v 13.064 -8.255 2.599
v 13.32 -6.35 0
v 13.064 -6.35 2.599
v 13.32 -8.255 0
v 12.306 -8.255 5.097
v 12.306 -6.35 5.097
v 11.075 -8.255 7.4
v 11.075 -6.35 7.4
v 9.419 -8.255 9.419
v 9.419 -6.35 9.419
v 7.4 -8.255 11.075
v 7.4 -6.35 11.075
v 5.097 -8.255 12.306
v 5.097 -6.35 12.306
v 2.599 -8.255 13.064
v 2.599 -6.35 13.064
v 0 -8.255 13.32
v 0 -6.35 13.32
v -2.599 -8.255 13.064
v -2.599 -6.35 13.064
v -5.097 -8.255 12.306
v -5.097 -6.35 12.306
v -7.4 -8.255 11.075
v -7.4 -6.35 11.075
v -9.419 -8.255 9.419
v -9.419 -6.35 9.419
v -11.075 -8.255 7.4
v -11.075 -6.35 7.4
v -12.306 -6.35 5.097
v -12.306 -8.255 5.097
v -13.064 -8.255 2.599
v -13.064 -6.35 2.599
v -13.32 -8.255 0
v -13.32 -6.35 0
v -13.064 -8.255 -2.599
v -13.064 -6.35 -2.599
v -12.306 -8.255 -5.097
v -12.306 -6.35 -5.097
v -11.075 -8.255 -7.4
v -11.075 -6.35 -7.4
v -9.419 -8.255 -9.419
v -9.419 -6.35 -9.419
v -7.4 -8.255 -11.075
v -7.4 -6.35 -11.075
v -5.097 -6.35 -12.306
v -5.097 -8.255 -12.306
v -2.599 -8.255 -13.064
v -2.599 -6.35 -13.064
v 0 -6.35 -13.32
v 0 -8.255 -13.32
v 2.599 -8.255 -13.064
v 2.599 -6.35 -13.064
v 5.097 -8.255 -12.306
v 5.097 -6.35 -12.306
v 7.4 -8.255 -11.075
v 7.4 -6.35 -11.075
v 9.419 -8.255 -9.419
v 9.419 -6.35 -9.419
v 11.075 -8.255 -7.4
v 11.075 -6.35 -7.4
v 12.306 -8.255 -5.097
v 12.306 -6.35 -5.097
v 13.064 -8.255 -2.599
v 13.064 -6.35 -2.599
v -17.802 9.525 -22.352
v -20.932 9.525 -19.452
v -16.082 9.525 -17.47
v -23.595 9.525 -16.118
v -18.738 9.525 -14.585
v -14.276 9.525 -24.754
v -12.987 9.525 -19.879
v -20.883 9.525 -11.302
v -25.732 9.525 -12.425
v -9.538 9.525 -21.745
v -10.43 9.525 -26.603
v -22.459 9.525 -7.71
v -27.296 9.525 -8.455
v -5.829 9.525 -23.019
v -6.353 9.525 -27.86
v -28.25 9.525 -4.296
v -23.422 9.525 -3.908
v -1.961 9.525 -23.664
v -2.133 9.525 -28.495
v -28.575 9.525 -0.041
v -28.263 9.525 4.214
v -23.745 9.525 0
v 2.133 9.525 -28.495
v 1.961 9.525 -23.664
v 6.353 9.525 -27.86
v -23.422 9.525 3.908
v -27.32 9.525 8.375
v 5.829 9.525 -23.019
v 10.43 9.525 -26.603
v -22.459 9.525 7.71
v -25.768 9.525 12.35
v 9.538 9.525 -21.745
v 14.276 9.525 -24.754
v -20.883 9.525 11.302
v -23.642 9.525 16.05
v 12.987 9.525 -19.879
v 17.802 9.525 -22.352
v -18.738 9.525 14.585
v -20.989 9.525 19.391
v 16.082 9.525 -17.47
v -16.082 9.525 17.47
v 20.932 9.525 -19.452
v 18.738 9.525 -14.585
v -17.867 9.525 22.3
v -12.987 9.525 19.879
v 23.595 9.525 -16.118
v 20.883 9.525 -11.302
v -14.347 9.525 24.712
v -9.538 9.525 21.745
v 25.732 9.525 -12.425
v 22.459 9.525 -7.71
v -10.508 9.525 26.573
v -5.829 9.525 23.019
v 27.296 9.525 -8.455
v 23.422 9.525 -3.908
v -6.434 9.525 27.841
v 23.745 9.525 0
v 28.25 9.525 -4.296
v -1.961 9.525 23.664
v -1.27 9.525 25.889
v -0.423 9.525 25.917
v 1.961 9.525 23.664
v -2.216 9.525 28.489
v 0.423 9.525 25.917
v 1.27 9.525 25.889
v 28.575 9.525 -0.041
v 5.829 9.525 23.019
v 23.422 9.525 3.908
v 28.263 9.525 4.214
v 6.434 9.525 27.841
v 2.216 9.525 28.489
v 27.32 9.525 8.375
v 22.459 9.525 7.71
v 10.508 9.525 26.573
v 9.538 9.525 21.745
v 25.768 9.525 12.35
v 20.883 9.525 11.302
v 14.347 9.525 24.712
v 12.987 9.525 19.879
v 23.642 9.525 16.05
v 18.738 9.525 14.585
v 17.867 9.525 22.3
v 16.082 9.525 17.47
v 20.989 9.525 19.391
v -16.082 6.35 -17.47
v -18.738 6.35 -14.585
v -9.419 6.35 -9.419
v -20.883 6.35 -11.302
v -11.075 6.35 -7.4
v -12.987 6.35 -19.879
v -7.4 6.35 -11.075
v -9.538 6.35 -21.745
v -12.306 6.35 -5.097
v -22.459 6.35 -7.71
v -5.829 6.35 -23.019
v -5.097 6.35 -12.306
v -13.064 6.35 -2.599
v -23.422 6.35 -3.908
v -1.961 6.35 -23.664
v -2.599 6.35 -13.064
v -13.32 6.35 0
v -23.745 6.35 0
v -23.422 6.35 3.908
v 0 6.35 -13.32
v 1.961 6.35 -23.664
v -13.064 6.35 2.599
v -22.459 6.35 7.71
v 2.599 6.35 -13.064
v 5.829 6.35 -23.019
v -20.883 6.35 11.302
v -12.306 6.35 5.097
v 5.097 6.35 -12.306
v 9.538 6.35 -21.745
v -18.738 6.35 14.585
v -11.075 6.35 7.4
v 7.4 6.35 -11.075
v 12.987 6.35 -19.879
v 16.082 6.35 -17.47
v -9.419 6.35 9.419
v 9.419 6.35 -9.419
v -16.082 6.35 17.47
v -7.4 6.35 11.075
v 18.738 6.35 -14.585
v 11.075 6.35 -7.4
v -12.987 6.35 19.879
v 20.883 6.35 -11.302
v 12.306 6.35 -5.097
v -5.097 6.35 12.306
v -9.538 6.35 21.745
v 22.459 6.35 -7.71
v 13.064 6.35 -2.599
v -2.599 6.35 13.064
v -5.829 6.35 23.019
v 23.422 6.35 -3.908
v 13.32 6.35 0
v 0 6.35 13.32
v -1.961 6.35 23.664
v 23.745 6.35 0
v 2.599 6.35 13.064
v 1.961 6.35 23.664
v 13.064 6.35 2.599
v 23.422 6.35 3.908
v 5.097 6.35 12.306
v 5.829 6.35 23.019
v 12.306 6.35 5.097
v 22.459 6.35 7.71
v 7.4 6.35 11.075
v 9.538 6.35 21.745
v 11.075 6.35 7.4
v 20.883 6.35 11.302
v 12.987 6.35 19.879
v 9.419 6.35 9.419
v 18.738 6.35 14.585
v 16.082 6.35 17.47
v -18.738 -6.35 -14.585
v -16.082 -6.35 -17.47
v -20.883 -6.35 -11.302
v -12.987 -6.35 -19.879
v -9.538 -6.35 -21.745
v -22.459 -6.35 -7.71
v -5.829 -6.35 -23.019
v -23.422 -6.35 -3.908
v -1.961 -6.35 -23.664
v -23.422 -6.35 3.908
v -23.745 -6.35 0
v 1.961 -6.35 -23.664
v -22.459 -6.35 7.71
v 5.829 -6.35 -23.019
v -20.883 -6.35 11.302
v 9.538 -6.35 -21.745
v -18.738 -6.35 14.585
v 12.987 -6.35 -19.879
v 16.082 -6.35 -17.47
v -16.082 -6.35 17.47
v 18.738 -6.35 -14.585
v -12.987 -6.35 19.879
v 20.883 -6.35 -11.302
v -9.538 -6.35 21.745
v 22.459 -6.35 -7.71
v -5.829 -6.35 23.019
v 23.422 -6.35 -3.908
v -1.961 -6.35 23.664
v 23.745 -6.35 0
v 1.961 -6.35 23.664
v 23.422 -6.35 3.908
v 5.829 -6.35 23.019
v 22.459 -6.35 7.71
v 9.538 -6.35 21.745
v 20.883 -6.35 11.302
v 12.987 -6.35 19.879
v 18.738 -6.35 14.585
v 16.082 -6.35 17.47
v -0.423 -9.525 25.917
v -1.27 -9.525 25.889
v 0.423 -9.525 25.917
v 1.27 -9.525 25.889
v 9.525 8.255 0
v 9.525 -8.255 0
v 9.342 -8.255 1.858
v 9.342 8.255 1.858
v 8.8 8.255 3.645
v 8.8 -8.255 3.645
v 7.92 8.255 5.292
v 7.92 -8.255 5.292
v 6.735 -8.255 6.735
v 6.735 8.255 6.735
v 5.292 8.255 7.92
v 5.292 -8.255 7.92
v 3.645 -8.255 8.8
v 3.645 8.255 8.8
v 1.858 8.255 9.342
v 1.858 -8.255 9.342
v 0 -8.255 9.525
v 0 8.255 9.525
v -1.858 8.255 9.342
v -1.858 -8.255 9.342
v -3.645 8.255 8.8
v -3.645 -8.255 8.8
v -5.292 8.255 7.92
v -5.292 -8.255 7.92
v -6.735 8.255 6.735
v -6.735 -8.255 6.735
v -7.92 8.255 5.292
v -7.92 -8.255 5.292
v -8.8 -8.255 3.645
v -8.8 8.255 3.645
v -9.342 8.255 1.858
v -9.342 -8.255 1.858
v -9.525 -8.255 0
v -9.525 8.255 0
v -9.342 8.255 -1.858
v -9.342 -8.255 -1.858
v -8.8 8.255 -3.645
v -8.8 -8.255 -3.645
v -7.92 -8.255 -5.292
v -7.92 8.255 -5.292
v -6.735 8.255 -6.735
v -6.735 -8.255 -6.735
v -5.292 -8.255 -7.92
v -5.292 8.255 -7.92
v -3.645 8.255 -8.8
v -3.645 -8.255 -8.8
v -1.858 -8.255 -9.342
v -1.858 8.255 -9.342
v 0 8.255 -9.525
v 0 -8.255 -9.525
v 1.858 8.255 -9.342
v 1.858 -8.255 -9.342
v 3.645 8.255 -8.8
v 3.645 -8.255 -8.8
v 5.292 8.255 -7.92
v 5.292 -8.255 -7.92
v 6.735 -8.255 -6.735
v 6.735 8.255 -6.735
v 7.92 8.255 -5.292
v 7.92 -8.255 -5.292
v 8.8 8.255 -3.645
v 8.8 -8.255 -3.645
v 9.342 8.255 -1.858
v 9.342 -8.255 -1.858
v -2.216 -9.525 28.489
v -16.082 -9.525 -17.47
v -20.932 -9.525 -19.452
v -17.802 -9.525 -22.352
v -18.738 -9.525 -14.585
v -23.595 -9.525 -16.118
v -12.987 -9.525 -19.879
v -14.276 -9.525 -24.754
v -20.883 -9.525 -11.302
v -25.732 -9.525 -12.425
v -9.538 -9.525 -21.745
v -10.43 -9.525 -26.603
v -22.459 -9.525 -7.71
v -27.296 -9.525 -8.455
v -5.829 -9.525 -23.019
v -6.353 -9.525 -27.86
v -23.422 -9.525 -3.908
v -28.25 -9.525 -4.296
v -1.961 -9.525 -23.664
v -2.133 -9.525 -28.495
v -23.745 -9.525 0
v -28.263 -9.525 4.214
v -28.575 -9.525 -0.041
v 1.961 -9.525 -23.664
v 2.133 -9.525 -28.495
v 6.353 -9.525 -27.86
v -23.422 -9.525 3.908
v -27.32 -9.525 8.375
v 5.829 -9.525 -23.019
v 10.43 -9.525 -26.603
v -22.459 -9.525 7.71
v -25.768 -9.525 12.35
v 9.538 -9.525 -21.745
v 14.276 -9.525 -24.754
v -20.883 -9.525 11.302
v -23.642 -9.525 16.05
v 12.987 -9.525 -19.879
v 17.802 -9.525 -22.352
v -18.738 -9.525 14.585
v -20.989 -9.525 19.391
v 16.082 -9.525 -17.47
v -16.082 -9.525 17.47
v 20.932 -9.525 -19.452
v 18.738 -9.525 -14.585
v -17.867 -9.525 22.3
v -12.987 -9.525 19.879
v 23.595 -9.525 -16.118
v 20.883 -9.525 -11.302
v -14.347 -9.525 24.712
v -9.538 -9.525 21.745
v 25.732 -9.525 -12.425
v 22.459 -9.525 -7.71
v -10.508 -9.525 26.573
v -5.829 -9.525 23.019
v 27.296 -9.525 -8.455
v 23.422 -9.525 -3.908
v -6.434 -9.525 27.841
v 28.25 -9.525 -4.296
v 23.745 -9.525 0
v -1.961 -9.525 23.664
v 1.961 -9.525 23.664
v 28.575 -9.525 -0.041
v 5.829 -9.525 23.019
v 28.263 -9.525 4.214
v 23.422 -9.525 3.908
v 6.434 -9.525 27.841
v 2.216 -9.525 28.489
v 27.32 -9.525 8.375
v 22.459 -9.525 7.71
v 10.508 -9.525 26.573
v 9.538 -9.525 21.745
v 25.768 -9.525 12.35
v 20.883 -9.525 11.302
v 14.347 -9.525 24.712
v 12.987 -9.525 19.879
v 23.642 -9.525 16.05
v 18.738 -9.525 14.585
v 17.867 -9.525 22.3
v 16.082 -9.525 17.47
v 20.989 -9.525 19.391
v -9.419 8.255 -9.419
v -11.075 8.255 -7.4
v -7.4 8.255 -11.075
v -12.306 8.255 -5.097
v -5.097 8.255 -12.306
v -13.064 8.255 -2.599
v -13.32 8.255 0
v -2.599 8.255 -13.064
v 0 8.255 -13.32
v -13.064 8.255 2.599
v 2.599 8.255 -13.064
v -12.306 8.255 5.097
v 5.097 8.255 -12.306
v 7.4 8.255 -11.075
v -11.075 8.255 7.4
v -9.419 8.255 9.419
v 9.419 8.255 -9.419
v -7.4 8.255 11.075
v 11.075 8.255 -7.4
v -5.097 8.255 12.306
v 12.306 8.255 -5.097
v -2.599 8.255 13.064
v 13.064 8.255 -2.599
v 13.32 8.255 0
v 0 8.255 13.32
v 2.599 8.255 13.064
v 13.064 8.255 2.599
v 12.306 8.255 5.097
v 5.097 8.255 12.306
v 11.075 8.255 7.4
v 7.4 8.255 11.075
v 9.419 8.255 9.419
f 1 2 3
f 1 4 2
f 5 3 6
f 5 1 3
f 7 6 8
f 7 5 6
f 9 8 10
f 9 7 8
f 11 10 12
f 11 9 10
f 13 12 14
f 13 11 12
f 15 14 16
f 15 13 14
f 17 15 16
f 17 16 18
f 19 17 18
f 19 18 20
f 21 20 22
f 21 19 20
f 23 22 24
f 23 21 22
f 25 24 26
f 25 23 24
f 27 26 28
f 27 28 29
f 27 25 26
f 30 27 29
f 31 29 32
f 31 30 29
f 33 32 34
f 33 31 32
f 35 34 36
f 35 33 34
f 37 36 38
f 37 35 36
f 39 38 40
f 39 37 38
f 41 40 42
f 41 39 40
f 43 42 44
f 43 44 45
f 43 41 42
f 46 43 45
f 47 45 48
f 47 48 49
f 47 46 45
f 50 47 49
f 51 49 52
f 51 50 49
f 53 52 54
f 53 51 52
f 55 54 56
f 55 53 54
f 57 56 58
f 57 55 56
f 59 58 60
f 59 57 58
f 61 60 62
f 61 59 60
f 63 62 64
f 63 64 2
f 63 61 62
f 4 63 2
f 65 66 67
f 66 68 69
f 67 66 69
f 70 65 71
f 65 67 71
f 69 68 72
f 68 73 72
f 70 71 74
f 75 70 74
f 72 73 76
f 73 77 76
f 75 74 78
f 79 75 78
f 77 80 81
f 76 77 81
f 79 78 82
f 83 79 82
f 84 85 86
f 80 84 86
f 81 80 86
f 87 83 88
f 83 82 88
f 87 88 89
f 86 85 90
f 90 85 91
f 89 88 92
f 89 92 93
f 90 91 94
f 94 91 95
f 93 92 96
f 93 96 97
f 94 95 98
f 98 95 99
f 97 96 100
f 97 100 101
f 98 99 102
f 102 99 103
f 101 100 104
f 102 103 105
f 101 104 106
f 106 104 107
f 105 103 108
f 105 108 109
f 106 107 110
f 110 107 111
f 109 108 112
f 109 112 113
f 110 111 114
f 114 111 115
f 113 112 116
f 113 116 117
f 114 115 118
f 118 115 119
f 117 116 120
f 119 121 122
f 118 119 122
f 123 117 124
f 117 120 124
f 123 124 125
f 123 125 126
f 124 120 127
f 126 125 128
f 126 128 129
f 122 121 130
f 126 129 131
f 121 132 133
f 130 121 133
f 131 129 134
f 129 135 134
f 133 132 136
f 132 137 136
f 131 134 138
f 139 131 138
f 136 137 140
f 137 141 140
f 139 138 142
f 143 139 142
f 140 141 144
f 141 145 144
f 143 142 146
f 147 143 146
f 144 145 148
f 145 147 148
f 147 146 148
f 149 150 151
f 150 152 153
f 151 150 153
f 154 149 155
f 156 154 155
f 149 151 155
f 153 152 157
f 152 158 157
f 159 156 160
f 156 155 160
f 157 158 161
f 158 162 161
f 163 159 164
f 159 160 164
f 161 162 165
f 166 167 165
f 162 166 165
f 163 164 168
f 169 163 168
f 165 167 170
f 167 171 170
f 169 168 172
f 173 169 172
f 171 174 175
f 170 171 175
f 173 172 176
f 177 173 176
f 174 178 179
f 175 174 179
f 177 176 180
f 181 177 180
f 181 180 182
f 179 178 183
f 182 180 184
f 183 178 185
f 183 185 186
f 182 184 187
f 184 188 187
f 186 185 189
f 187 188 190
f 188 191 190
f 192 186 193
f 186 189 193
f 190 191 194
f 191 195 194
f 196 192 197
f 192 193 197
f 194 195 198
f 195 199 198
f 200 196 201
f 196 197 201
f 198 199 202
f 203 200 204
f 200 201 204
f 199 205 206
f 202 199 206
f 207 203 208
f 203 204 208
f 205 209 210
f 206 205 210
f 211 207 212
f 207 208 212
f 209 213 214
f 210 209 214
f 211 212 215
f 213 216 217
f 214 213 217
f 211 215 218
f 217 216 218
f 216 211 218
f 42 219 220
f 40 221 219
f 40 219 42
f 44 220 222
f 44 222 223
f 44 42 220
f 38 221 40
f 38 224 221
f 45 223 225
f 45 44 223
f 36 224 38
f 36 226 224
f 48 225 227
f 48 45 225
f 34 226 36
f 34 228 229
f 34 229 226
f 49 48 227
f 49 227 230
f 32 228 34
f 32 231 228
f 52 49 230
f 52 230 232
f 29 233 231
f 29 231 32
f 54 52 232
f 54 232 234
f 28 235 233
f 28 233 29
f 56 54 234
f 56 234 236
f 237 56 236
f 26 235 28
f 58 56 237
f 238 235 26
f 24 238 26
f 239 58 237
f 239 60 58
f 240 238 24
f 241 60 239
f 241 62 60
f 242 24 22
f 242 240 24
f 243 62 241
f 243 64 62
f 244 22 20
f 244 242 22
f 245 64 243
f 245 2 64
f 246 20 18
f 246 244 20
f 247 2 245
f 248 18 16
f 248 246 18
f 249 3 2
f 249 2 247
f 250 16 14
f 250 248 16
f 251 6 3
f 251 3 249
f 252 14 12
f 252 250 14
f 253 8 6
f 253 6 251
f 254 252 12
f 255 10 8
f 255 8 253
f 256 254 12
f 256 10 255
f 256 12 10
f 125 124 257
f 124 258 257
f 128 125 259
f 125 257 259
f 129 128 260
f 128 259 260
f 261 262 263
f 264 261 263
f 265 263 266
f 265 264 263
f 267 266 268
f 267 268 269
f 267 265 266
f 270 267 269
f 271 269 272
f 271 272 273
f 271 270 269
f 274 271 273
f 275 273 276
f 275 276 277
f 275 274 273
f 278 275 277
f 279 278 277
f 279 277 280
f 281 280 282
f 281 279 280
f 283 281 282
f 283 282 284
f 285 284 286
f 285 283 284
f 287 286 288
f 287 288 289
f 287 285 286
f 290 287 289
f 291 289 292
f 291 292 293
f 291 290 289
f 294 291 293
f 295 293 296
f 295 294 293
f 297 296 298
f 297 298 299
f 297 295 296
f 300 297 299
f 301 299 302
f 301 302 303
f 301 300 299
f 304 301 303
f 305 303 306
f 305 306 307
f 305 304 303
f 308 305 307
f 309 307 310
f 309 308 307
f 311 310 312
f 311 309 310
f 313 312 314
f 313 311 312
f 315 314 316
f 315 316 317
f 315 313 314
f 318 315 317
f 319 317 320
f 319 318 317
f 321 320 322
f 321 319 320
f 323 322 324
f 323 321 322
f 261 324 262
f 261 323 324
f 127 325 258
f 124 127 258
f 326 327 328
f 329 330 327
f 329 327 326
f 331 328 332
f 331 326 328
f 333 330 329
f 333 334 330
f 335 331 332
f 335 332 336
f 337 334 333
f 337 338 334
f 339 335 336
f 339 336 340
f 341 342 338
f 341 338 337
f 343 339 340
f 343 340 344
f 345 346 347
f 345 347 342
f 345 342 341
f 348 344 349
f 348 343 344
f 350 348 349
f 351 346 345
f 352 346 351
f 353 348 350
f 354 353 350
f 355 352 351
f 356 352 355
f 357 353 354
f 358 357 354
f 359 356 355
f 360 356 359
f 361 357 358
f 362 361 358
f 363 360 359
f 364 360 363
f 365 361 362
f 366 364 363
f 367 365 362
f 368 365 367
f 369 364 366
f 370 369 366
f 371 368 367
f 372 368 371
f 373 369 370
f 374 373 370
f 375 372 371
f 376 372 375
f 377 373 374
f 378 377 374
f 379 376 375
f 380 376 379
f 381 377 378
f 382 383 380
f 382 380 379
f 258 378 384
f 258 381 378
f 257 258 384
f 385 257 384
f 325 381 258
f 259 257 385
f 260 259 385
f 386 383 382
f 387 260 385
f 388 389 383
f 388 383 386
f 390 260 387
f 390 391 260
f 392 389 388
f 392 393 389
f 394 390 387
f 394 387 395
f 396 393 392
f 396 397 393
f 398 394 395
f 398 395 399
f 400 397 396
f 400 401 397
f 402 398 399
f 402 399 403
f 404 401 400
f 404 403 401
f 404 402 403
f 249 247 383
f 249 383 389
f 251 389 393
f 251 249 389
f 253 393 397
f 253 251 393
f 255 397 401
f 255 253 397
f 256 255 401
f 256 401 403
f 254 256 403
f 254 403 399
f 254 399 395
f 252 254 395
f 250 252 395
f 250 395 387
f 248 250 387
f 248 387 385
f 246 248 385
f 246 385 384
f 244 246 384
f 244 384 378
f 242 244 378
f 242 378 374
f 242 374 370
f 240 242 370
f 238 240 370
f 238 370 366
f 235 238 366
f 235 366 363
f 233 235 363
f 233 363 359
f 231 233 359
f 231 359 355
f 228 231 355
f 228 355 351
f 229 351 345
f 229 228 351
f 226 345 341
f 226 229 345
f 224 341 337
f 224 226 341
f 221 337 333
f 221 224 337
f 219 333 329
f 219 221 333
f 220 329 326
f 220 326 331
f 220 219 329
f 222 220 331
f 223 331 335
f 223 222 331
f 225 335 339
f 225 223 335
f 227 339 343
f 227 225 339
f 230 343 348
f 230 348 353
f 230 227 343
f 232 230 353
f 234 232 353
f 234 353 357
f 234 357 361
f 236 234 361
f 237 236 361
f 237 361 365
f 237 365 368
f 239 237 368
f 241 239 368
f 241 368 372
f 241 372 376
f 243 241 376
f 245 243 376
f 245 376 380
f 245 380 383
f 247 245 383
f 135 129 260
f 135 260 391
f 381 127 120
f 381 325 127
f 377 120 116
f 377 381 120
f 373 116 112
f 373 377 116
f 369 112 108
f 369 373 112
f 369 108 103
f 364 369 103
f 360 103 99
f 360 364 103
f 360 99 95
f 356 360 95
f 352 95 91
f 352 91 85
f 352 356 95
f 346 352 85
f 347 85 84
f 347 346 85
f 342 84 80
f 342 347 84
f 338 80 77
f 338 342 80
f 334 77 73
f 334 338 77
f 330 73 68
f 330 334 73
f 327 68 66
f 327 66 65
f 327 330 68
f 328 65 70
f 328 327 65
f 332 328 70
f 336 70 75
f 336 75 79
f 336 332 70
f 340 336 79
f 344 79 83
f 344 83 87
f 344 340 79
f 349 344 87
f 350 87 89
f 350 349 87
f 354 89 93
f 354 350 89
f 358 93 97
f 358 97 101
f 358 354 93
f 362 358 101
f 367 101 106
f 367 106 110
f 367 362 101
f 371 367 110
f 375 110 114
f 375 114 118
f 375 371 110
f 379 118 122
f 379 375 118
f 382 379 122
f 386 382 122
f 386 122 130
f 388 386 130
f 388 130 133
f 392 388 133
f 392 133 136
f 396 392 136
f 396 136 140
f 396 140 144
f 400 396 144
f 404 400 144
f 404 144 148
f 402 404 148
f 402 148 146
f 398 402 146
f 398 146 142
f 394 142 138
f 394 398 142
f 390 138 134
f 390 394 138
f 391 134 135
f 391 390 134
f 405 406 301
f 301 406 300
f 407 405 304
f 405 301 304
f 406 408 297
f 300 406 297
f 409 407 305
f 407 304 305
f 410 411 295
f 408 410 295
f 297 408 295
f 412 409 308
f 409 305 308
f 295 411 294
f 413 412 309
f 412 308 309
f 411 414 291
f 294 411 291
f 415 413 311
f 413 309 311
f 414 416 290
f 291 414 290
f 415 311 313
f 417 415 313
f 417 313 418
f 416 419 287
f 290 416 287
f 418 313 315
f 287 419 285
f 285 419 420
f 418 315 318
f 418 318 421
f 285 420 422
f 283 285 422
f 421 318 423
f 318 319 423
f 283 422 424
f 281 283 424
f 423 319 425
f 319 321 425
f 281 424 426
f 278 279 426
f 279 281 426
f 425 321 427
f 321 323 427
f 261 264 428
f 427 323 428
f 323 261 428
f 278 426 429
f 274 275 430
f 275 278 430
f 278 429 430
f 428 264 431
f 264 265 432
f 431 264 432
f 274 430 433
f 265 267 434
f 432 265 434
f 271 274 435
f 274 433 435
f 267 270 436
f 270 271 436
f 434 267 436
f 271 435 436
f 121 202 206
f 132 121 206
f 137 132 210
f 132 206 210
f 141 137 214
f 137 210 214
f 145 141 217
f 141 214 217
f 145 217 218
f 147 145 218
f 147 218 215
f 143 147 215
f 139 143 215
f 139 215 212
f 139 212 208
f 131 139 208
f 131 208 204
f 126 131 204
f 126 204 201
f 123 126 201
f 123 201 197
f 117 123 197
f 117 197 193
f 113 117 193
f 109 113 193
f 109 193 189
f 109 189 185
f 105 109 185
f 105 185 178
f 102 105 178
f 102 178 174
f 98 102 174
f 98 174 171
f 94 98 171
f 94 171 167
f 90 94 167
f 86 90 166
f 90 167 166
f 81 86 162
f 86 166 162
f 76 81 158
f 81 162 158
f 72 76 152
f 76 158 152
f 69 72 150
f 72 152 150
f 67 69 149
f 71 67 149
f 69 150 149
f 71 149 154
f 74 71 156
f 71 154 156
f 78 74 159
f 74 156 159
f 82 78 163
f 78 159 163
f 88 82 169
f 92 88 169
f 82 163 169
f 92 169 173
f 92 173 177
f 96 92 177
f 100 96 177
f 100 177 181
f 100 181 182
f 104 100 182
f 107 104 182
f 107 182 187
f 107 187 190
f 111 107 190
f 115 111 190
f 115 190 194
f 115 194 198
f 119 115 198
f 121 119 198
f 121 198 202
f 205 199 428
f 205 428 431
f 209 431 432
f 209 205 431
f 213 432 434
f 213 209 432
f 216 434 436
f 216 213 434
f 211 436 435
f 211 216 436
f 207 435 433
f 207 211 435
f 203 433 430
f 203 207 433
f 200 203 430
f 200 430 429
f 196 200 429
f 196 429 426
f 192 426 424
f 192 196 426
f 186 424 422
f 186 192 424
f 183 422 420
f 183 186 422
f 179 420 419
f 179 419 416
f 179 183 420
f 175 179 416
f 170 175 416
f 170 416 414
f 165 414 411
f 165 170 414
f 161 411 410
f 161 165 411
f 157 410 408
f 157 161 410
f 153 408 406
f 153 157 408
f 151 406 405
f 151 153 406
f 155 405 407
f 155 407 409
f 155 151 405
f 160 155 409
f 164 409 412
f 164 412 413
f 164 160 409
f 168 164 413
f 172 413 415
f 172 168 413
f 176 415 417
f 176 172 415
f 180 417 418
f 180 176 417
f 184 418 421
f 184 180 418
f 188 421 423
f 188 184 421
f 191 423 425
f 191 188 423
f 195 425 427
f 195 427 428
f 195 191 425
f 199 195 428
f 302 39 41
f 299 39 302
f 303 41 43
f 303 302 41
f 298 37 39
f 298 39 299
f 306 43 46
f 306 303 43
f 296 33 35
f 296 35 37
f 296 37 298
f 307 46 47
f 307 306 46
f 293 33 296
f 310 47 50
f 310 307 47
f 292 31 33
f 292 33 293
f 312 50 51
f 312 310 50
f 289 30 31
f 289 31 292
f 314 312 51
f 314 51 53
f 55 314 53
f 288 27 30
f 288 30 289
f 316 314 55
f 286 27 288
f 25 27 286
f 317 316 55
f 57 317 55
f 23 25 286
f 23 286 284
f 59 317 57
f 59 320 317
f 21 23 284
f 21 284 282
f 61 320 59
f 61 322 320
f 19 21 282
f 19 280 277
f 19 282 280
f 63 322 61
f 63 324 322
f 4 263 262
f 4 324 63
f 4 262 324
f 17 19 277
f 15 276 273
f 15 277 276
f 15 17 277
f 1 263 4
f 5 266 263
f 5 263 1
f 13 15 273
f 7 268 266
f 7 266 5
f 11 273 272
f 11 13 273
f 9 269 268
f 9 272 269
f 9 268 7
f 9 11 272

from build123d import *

# Parameters (mm, degrees)
F0_R     = 23.7453835504
F0_R_2   = 13.3203594212
F1_DEPTH = 6.35
F2_DEPTH = 9.525
F0_R_3   = 9.525
F3_DEPTH = 8.255
F4_DEPTH = 9.525
F5_DEPTH = 9.525


# Not quite as in the source:
# - a feature names something its author has since deleted; it is built from what else it names


with BuildPart() as f1:
    # F0 (on Front) → F1 (new body, symmetric)
    with BuildSketch(Plane.XZ):
        Circle(F0_R)
        Circle(F0_R_2, mode=Mode.SUBTRACT)
    extrude(amount=F1_DEPTH, both=True)

    # F0 (on Front) → F2 (join, symmetric)
    with BuildSketch(Plane.XZ):
        with BuildLine():
            ThreePointArc((25.9205484169, 0), (18.7722391675, 17.8739437974), (1.27, 25.8894173405))
            ThreePointArc((1.27, 25.8894173405), (0, 25.9205484169), (-1.27, 25.8894173405))
            ThreePointArc((-1.27, 25.8894173405), (-17.8739437974, -18.7722391675), (25.9205484169, 0))
        make_face()
        Circle(F0_R, mode=Mode.SUBTRACT)
    extrude(amount=F2_DEPTH, both=True)

    # F0 (on Front) → F3 (join, symmetric)
    with BuildSketch(Plane.XZ):
        Circle(F0_R_2)
        Circle(F0_R_3, mode=Mode.SUBTRACT)
    extrude(amount=F3_DEPTH, both=True)

    # F0 (on Front) → F4 (join, symmetric)
    with BuildSketch(Plane.XZ):
        with BuildLine():
            Line((1.27, 25.8894173405), (2.2161464291, 28.48893329))
            ThreePointArc((2.2161464291, 28.48893329), (0, 28.575), (-2.2161464291, 28.48893329))
            Line((-2.2161464291, 28.48893329), (-1.27, 25.8894173405))
            ThreePointArc((-1.27, 25.8894173405), (0, 25.9205484169), (1.27, 25.8894173405))
        make_face()
        with BuildLine():
            ThreePointArc((-2.2161464291, 28.48893329), (-19.406239213, -20.9744726896), (28.575, 0))
            ThreePointArc((28.575, 0), (20.9744726896, 19.406239213), (2.2161464291, 28.48893329))
            Line((2.2161464291, 28.48893329), (1.27, 25.8894173405))
            ThreePointArc((1.27, 25.8894173405), (18.7722391675, 17.8739437974), (25.9205484169, 0))
            ThreePointArc((25.9205484169, 0), (-17.8739437974, -18.7722391675), (-1.27, 25.8894173405))
            Line((-1.27, 25.8894173405), (-2.2161464291, 28.48893329))
        make_face()
    extrude(amount=F4_DEPTH, both=True)

    # F0 (on Front) → F5 (cut, symmetric)
    with BuildSketch(Plane.XZ):
        with BuildLine():
            Line((1.27, 25.8894173405), (2.2161464291, 28.48893329))
            ThreePointArc((2.2161464291, 28.48893329), (0, 28.575), (-2.2161464291, 28.48893329))
            Line((-2.2161464291, 28.48893329), (-1.27, 25.8894173405))
            ThreePointArc((-1.27, 25.8894173405), (0, 25.9205484169), (1.27, 25.8894173405))
        make_face()
    extrude(amount=F5_DEPTH, both=True, mode=Mode.SUBTRACT)


solid = f1.part
